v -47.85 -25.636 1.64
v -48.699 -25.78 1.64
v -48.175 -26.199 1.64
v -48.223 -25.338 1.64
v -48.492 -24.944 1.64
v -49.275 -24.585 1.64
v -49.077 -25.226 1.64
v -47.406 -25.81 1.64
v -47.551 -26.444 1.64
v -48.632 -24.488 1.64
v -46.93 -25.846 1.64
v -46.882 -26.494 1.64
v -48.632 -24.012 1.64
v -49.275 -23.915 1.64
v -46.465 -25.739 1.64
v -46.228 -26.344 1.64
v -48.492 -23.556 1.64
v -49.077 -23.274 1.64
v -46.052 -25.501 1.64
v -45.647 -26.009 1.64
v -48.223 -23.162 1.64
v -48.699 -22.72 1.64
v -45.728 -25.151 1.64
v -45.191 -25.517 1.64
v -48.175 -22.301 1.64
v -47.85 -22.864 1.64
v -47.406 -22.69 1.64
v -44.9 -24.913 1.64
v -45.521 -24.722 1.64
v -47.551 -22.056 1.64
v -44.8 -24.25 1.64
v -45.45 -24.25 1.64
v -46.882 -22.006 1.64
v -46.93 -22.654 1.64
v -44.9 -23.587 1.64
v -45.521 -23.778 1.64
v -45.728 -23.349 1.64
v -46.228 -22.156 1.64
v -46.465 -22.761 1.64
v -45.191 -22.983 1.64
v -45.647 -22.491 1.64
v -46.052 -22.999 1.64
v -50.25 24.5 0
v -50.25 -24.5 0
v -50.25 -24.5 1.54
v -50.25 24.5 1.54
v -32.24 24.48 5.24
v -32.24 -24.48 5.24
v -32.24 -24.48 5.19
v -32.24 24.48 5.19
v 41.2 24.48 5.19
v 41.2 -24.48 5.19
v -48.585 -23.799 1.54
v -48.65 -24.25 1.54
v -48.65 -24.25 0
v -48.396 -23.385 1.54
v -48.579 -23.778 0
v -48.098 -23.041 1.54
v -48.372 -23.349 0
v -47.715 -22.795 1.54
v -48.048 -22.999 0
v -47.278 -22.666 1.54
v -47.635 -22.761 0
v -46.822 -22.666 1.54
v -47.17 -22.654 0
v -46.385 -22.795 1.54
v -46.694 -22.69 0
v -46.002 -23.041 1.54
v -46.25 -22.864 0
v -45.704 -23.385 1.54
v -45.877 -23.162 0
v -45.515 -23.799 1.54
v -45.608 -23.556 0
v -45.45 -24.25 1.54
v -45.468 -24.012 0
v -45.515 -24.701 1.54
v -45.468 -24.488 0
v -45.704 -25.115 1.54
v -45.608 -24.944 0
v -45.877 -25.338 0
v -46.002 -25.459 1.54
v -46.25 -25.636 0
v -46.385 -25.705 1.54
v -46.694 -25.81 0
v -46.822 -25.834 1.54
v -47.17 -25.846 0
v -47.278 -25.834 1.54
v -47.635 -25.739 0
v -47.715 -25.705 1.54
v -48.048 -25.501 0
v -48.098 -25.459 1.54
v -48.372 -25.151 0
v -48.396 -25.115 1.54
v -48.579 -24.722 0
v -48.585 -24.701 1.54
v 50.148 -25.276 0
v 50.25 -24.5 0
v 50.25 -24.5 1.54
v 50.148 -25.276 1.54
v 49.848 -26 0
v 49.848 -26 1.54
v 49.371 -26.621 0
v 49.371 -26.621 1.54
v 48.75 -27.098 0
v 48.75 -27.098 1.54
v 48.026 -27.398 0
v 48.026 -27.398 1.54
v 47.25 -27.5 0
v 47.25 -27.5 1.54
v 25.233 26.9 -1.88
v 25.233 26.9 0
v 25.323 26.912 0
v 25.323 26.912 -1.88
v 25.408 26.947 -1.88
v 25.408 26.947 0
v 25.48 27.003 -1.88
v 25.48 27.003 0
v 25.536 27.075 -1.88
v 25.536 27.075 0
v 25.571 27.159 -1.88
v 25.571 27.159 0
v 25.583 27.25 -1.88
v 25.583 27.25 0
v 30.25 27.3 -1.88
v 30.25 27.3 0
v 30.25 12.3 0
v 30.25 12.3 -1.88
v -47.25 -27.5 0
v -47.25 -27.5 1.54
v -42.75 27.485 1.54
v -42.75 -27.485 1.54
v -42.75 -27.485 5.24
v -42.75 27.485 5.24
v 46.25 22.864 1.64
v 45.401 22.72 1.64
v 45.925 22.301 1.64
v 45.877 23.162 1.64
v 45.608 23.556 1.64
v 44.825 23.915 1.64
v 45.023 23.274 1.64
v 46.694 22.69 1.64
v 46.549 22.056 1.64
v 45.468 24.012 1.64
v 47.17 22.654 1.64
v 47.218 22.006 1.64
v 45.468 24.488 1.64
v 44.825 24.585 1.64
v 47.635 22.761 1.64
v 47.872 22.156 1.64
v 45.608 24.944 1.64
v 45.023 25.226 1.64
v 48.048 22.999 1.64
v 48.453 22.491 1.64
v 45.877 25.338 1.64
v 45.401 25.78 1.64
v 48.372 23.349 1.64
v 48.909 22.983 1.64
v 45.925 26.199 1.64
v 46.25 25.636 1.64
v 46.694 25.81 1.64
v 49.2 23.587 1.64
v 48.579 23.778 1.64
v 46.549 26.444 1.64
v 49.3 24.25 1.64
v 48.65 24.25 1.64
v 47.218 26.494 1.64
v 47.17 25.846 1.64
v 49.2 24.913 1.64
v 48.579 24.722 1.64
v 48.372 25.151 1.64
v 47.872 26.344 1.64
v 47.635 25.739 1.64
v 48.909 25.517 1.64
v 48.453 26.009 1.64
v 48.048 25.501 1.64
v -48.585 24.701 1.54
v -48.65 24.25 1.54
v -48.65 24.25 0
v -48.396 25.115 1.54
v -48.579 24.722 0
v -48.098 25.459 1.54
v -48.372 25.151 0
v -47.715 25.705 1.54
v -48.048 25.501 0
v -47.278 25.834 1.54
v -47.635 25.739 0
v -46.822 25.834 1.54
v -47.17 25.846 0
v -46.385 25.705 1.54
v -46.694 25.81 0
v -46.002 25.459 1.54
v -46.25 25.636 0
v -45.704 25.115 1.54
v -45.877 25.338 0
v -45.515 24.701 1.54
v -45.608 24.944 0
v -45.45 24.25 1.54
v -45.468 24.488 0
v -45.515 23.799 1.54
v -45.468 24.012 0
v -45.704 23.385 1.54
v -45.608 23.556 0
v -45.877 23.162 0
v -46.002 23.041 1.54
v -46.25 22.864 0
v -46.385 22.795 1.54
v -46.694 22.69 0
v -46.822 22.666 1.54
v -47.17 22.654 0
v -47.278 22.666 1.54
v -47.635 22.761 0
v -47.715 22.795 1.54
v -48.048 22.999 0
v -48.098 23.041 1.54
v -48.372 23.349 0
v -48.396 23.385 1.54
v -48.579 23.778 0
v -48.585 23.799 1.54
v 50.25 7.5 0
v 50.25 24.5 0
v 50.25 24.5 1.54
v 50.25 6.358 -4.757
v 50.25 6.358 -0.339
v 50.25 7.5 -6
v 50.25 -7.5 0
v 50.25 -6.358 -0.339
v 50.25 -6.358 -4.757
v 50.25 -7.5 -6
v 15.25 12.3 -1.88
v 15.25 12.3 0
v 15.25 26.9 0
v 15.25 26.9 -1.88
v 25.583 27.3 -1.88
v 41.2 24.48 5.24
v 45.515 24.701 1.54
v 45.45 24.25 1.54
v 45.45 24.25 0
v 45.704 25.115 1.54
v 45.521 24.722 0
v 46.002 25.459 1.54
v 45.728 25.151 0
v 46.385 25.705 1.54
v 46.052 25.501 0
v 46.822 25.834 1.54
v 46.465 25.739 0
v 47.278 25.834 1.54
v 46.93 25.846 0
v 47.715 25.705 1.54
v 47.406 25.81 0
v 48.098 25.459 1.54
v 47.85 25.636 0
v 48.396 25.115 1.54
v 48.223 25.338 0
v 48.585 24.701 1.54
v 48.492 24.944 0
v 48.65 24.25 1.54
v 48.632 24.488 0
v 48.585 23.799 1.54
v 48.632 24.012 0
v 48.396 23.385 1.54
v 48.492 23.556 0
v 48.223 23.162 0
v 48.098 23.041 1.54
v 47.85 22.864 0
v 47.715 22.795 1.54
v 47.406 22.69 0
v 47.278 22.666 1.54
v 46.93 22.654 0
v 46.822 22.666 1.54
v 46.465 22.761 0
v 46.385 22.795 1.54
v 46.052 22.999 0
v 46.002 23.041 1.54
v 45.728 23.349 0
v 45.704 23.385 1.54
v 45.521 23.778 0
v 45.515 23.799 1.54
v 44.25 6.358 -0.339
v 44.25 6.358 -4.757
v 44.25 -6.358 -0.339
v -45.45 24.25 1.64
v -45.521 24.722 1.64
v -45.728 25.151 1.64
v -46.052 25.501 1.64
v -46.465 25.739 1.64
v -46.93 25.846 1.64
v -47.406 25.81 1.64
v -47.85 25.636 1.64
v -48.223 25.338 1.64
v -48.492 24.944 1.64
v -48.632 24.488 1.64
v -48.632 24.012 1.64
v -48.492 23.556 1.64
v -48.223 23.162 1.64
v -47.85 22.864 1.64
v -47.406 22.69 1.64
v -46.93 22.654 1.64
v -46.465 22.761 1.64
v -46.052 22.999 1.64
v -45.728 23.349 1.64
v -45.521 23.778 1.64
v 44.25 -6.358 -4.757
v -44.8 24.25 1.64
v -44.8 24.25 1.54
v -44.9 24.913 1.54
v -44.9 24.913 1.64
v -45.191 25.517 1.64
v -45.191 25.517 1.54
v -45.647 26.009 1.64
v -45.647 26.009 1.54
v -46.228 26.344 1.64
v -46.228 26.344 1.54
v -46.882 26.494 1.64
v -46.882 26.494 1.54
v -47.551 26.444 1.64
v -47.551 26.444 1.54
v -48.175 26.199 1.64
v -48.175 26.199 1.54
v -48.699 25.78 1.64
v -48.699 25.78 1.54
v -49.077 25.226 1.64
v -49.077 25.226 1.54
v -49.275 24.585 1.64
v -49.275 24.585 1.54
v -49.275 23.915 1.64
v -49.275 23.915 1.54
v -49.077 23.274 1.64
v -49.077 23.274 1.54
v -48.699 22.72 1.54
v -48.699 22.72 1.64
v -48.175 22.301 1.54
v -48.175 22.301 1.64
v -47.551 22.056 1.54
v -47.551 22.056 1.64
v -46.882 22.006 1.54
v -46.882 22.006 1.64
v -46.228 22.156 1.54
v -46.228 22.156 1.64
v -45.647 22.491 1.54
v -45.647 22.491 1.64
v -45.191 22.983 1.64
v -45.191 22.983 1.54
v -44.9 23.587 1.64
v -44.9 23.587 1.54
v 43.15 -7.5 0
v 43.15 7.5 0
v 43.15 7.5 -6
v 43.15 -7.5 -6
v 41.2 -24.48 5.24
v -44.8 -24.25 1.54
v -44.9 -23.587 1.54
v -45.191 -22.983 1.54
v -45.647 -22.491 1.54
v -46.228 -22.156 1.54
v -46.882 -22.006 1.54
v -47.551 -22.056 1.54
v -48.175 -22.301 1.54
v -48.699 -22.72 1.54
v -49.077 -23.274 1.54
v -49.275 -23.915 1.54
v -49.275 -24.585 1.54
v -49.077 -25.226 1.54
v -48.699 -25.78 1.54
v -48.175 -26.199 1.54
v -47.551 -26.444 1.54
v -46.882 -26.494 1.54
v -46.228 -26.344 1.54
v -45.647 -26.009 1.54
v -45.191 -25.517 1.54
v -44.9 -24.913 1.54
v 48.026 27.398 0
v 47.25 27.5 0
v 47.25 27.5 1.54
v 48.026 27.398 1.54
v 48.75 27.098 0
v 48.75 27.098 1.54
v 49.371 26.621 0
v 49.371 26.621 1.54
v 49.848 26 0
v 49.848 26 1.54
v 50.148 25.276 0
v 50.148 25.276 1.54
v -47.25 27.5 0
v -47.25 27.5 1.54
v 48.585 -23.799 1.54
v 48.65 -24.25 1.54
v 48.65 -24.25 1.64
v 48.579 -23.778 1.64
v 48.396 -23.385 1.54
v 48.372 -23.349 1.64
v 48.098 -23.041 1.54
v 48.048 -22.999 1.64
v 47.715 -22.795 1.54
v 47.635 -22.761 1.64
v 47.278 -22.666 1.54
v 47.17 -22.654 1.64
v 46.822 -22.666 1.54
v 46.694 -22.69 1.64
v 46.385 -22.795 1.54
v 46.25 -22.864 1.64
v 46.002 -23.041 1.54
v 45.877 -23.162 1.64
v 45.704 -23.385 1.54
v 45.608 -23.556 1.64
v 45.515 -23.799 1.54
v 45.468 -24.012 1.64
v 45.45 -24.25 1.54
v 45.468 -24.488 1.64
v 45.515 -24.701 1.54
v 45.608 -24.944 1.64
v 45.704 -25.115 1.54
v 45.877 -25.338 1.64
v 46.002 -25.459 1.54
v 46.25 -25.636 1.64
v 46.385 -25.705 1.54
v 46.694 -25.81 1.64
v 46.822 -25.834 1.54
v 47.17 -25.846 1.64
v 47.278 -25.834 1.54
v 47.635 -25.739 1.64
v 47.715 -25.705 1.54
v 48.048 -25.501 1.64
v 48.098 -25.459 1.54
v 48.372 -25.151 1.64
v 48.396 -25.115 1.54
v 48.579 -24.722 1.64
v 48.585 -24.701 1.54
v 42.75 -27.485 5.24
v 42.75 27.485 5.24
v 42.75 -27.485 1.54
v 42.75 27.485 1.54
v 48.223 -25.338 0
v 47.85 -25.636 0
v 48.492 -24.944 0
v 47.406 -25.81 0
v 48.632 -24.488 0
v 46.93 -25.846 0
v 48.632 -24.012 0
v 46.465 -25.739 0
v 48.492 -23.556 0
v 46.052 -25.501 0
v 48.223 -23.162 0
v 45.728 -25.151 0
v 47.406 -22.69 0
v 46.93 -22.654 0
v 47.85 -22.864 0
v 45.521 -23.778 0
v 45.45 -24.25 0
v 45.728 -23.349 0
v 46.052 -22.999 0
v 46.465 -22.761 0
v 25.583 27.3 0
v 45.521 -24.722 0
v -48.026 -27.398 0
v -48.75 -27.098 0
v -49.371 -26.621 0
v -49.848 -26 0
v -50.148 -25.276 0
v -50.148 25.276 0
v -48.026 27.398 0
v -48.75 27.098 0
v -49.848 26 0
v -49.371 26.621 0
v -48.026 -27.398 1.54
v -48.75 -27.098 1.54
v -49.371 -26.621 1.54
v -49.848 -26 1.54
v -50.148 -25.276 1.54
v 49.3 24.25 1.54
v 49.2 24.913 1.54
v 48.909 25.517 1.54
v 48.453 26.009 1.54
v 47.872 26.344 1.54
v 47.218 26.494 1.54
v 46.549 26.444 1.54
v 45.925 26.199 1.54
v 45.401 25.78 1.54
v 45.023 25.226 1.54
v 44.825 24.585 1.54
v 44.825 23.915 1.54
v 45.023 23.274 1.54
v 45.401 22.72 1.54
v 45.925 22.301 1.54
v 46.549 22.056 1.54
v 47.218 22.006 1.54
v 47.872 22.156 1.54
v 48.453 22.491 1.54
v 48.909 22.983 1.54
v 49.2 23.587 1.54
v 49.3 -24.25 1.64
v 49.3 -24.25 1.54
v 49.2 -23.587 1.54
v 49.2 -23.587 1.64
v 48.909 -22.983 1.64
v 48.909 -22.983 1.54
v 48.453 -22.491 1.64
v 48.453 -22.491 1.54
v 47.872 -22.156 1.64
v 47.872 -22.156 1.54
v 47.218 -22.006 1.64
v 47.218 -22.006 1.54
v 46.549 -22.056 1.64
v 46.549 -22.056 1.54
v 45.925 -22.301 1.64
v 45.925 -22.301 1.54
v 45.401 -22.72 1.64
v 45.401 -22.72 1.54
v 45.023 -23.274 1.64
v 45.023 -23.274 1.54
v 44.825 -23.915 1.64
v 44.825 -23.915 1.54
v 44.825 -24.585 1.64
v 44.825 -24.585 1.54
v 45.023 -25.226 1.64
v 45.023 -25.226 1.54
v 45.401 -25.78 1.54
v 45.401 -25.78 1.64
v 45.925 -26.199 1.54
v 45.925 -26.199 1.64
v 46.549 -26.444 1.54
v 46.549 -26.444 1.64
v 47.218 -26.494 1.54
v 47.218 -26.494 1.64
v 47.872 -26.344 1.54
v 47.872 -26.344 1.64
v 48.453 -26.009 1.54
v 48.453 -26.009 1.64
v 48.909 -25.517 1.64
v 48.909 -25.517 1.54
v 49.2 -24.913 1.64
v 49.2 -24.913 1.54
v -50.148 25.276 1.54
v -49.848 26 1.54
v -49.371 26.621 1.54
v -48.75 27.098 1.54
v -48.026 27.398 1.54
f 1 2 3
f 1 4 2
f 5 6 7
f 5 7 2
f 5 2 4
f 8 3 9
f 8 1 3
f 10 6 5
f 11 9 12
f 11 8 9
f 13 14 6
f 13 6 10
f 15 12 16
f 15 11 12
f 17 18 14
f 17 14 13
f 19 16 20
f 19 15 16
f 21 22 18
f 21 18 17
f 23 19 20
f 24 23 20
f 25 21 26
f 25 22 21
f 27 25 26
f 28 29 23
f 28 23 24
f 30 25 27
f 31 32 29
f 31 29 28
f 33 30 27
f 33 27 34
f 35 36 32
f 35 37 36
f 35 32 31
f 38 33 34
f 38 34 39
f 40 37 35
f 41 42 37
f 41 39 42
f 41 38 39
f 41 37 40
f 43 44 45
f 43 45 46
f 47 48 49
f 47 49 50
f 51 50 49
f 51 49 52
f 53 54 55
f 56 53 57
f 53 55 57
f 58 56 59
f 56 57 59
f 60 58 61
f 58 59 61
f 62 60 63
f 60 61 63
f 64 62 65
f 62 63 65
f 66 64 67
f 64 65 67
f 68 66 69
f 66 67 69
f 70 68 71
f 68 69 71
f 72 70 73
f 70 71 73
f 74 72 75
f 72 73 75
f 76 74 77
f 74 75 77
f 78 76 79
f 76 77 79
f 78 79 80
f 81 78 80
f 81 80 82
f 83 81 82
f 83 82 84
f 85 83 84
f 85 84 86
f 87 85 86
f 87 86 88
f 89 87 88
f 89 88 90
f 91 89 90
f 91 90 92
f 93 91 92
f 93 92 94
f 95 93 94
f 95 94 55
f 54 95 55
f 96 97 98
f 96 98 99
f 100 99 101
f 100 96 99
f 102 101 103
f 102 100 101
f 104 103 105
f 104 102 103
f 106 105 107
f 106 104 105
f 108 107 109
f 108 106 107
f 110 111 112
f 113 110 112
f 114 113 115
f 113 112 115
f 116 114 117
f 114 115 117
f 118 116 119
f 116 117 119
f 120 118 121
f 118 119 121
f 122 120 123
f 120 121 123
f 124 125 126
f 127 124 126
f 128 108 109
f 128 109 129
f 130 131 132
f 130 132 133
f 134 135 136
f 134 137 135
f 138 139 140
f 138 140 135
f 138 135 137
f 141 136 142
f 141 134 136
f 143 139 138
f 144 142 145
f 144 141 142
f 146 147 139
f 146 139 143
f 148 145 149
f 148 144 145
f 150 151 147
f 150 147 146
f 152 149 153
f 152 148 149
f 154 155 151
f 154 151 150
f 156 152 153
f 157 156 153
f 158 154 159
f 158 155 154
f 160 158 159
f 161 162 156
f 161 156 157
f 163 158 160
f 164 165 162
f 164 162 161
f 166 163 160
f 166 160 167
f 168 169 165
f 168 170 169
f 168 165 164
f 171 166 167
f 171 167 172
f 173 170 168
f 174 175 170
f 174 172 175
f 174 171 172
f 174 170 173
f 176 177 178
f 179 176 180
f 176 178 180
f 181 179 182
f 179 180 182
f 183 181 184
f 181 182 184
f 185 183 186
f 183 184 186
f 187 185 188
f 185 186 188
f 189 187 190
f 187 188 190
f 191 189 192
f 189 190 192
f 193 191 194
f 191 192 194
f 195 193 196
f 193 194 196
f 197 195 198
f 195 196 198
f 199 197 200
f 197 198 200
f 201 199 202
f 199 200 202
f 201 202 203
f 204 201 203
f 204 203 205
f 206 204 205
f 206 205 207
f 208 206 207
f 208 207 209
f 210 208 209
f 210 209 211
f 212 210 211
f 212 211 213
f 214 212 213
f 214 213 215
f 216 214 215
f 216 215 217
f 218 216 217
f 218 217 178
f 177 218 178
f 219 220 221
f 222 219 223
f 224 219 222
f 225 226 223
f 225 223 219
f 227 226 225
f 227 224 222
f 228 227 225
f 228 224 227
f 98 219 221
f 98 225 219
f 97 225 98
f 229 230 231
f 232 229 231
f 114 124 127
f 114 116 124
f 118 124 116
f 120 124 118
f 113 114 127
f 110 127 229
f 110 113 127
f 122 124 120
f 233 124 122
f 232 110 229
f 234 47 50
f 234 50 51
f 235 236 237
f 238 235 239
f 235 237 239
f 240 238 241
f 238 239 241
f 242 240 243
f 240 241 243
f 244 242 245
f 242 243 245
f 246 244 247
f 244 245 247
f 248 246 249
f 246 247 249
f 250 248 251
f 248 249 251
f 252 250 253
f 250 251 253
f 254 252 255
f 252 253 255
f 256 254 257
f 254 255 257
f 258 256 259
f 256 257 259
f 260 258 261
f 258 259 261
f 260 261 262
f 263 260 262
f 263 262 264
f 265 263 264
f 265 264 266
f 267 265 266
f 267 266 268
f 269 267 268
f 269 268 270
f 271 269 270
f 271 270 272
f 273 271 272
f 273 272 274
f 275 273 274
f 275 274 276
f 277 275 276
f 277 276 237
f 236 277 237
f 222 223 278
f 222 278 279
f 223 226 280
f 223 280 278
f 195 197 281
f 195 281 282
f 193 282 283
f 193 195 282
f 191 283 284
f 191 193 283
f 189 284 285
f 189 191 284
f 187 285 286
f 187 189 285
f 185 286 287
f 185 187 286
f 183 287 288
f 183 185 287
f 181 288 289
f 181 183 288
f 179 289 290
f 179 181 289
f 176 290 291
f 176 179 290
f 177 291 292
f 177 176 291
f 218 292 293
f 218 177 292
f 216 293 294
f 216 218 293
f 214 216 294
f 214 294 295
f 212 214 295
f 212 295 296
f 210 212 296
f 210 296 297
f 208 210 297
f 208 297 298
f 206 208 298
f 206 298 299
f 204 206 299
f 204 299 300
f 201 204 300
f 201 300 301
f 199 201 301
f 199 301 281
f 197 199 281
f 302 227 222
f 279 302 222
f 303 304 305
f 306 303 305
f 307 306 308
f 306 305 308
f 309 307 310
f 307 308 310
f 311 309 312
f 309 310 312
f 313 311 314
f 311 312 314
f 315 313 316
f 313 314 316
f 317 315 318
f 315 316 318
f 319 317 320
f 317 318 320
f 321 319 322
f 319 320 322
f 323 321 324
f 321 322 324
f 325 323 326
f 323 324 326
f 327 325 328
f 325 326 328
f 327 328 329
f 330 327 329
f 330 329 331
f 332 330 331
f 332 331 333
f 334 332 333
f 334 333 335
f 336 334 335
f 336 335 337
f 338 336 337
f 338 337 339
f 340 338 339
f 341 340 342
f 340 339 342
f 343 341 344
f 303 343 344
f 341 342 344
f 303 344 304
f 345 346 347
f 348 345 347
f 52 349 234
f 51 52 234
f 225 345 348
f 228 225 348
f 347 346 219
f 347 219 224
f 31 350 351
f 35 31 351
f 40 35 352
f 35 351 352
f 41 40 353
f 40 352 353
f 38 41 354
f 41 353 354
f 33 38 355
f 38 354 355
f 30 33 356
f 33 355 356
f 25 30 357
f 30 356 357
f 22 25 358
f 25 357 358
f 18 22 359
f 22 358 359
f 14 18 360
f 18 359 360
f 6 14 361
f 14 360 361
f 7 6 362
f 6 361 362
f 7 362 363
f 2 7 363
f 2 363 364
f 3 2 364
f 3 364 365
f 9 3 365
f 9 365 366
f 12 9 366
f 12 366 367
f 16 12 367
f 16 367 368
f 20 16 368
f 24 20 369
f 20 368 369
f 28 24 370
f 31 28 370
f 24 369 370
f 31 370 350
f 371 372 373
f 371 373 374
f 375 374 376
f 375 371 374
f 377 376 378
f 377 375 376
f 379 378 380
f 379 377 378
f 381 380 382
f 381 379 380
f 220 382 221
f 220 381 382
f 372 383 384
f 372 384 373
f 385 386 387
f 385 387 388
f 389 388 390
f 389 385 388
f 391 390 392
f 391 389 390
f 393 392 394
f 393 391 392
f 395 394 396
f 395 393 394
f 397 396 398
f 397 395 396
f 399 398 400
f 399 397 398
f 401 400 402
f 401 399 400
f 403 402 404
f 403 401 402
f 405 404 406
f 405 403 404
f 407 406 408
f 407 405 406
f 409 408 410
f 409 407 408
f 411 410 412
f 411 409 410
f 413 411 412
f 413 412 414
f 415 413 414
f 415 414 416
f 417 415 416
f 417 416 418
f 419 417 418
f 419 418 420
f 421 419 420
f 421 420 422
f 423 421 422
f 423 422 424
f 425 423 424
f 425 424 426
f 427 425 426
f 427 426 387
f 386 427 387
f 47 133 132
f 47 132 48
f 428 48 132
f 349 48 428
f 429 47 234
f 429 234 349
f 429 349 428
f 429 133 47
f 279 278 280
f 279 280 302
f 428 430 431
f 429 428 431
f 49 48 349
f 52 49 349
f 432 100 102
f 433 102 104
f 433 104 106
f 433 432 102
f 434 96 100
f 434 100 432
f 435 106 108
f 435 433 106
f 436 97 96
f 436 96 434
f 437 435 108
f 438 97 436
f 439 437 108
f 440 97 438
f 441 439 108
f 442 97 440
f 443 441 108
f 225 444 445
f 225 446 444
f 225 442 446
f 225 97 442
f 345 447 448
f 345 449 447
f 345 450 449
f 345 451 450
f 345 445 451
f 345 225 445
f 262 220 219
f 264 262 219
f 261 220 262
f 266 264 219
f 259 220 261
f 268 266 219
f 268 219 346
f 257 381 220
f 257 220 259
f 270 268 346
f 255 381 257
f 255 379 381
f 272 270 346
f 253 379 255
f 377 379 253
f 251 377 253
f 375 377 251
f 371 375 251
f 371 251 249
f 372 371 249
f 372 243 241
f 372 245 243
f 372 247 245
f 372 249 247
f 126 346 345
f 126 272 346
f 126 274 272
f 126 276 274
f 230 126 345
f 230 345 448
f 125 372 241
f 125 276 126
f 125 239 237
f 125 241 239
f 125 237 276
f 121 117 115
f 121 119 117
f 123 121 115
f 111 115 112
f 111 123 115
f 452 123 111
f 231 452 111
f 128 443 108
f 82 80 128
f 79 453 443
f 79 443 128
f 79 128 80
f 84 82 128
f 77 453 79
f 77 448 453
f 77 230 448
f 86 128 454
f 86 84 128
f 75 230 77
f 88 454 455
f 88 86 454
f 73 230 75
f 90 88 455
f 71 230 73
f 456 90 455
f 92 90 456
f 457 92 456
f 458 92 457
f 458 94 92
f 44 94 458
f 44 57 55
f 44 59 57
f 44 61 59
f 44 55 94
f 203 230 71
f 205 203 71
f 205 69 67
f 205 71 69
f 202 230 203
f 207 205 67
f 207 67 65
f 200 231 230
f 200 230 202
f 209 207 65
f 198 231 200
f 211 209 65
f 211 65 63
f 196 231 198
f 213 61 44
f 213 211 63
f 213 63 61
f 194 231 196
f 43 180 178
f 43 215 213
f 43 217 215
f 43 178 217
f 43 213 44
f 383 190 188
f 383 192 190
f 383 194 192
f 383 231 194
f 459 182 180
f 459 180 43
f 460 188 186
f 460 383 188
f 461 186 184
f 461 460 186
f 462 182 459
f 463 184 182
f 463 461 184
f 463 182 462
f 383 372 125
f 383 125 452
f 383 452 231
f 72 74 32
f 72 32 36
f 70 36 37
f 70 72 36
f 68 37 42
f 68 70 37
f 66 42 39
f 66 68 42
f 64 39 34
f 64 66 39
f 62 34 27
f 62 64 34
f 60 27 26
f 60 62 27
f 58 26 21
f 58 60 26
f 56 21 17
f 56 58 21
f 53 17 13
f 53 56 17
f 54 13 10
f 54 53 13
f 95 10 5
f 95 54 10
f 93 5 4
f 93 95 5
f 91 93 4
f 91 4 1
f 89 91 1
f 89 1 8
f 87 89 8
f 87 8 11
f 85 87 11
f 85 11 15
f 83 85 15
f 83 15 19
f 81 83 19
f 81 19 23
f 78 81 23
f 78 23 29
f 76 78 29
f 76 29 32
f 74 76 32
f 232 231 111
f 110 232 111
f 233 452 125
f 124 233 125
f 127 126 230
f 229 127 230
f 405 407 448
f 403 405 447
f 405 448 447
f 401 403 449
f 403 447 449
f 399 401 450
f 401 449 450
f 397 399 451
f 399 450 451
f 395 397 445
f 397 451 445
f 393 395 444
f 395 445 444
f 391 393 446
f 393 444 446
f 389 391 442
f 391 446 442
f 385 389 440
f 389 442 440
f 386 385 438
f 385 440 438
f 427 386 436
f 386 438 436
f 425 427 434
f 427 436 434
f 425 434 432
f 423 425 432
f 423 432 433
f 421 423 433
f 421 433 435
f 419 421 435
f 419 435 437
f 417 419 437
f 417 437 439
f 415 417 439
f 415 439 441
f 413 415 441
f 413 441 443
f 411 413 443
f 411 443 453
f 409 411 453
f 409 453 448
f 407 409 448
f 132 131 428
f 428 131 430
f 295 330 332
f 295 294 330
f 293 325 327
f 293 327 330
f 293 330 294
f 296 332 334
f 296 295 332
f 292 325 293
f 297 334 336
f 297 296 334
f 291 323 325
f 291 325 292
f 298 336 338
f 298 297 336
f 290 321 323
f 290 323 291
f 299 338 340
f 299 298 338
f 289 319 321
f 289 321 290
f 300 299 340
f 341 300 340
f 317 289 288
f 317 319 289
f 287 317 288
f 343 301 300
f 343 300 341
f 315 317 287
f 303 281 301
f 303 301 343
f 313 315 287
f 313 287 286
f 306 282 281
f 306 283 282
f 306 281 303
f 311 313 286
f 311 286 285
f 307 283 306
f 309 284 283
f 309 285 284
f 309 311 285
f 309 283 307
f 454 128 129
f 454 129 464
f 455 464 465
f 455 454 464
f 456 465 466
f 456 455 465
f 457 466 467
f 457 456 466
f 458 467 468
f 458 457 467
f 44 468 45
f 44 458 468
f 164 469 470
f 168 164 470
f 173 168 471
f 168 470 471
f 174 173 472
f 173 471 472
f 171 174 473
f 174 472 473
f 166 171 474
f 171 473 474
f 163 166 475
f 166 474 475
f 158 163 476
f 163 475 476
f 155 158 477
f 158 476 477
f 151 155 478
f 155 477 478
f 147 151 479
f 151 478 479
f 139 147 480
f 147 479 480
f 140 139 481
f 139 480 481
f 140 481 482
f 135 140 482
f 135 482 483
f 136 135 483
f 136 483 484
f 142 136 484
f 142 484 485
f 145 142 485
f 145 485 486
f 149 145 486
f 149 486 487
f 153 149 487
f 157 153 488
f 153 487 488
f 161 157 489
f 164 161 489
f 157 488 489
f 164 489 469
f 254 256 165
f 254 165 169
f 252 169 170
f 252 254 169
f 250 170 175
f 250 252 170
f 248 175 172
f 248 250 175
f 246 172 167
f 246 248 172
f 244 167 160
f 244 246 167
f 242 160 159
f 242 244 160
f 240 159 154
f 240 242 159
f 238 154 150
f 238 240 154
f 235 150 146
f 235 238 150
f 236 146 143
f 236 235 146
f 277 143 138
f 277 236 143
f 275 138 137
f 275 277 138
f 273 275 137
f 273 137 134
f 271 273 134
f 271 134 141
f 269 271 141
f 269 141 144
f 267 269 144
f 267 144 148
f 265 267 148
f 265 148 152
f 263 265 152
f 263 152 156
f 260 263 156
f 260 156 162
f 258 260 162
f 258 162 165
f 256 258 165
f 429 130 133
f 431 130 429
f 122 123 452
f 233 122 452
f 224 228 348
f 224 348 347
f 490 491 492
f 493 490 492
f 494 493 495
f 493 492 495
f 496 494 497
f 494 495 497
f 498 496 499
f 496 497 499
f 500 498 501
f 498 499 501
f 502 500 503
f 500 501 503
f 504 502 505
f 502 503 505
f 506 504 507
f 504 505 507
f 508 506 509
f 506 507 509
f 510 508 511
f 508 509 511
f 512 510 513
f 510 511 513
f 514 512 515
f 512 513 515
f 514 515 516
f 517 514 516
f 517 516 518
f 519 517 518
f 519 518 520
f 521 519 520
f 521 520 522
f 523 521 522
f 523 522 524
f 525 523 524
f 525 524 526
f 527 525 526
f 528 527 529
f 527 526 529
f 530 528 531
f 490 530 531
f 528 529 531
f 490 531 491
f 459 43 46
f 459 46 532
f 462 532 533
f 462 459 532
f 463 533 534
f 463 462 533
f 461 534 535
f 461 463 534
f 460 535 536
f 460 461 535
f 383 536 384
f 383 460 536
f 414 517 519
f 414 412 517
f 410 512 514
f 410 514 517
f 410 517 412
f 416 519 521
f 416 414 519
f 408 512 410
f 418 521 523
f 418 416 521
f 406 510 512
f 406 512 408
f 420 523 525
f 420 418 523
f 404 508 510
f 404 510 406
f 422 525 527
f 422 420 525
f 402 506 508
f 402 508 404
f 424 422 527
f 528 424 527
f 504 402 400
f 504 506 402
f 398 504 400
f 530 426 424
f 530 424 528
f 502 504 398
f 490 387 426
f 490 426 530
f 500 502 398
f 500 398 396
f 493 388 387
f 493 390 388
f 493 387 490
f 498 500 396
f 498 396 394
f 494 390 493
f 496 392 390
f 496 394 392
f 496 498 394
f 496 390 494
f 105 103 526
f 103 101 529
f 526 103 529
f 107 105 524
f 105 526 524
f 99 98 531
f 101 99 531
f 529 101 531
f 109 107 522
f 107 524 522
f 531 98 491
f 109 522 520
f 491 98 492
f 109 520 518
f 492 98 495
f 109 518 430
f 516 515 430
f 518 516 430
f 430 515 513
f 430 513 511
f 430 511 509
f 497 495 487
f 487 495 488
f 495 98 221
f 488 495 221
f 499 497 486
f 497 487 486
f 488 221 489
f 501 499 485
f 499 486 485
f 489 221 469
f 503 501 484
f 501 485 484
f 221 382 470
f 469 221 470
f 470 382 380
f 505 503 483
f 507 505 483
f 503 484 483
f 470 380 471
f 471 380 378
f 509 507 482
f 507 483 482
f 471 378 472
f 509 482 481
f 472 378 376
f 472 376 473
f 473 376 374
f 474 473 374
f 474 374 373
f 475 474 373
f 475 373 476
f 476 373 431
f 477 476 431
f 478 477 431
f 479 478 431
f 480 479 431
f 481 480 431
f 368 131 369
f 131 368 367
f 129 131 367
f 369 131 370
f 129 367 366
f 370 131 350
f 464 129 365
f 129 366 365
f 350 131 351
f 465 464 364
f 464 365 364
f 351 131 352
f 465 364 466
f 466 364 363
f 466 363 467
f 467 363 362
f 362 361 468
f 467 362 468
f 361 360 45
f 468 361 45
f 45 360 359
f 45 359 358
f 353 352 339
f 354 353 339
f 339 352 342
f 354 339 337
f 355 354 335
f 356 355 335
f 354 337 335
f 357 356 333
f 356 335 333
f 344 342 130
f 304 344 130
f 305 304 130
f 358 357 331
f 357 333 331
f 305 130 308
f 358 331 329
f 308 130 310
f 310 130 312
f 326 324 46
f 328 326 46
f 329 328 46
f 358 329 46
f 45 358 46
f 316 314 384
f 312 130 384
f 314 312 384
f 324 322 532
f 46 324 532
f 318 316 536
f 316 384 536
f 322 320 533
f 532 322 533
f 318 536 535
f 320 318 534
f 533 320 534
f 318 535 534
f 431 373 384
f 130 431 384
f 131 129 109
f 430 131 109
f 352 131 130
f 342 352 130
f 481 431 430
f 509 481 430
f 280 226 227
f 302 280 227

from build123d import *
from build123d.topology import SkipClean

# Parameters (mm, degrees)
BOSS_EXTRUDE1_DEPTH        = 1.54
F_3_2_3_2_DIAMETER_HOLE1_D = 3.2
SKETCH4_R                  = 2.25
SKETCH4_R_2                = 1.6
BOSS_EXTRUDE2_DEPTH        = 0.1
SKETCH5_W                  = 85.5
SKETCH5_H                  = 54.969341598
BOSS_EXTRUDE3_DEPTH        = 3.7
SKETCH6_W                  = 73.44
SKETCH6_H                  = 48.96
CUT_EXTRUDE1_DEPTH         = 0.05
SKETCH7_W                  = 6
SKETCH7_H                  = 15
BOSS_EXTRUDE4_DEPTH        = 7.1
SKETCH8_W                  = 4.418406876
SKETCH8_H                  = 12.715571876
CUT_EXTRUDE2_DEPTH         = 6
BOSS_EXTRUDE5_DEPTH        = 1.88


with BuildPart() as part:
    # Sketch1 → Boss-Extrude1 (new body)
    with BuildSketch(Plane.XY):
        with BuildLine():
            Line((-47.25, 27.5), (47.25, 27.5))
            ThreePointArc((47.25, 27.5), (49.371320344, 26.621320344), (50.25, 24.5))
            Line((50.25, 24.5), (50.25, -24.5))
            ThreePointArc((50.25, -24.5), (49.371320344, -26.621320344), (47.25, -27.5))
            Line((47.25, -27.5), (-47.25, -27.5))
            ThreePointArc((-47.25, -27.5), (-49.371320344, -26.621320344), (-50.25, -24.5))
            Line((-50.25, -24.5), (-50.25, 24.5))
            ThreePointArc((-50.25, 24.5), (-49.371320344, 26.621320344), (-47.25, 27.5))
        make_face()
    extrude(amount=BOSS_EXTRUDE1_DEPTH)

    # Ø3.2 (3.2) Diameter Hole1 (through all)
    with Locations(Plane.XY.offset(1.54)):
        with Locations((-47.05, 24.25), (47.05, 24.25), (47.05, -24.25), (-47.05, -24.25)):
            Hole(F_3_2_3_2_DIAMETER_HOLE1_D / 2)

    # Sketch4 → Boss-Extrude2 (add)
    # profile 1 of 4: a face of its own
    with SkipClean():  # the faces are left unmerged after this step: merging them gives an invalid solid
        with BuildSketch(Plane.XY.offset(1.54)):
            with Locations((-47.05, 24.25)):
                Circle(SKETCH4_R)
            with Locations((-47.05, 24.25)):
                Circle(SKETCH4_R_2, mode=Mode.SUBTRACT)
        # profile 2 of 4: a face of its own
        with BuildSketch(Plane.XY.offset(1.54)):
            with Locations((-47.05, -24.25)):
                Circle(SKETCH4_R)
            with Locations((-47.05, -24.25)):
                Circle(SKETCH4_R_2, mode=Mode.SUBTRACT)
        # profile 3 of 4: a face of its own
        with BuildSketch(Plane.XY.offset(1.54)):
            with Locations((47.05, -24.25)):
                Circle(SKETCH4_R)
            with Locations((47.05, -24.25)):
                Circle(SKETCH4_R_2, mode=Mode.SUBTRACT)
        # profile 4 of 4: a face of its own
        with BuildSketch(Plane.XY.offset(1.54)):
            with Locations((47.05, 24.25)):
                Circle(SKETCH4_R)
            with Locations((47.05, 24.25)):
                Circle(SKETCH4_R_2, mode=Mode.SUBTRACT)
        extrude(amount=BOSS_EXTRUDE2_DEPTH)
    add(part.part.scale(1), mode=Mode.REPLACE)  # the faces are merged on a copy

    # Sketch5 → Boss-Extrude3 (add)
    with BuildSketch(Plane.XY.offset(1.54)):
        Rectangle(SKETCH5_W, SKETCH5_H)
    extrude(amount=BOSS_EXTRUDE3_DEPTH)

    # Sketch6 → Cut-Extrude1 (cut)
    with BuildSketch(Plane.XY.offset(5.24)):
        with Locations((4.48, 0)):
            Rectangle(SKETCH6_W, SKETCH6_H)
    extrude(amount=-CUT_EXTRUDE1_DEPTH, mode=Mode.SUBTRACT)

    # Sketch7 → Boss-Extrude4 (add)
    with BuildSketch(Plane(origin=(50.25, 0, 0), x_dir=(0, 0, -1), z_dir=(1, 0, 0))):
        with Locations((3, 0)):
            Rectangle(SKETCH7_W, SKETCH7_H)
    extrude(amount=-BOSS_EXTRUDE4_DEPTH)

    # Sketch8 → Cut-Extrude2 (cut)
    with BuildSketch(Plane(origin=(50.25, 0, 0), x_dir=(0, 0, -1), z_dir=(1, 0, 0))):
        with Locations((2.548027157, 0)):
            Rectangle(SKETCH8_W, SKETCH8_H)
    extrude(amount=-CUT_EXTRUDE2_DEPTH, mode=Mode.SUBTRACT)

    # Sketch9 → Boss-Extrude5 (add)
    with BuildSketch(Plane(origin=(0, 0, 0), x_dir=(-1, 0, 0), z_dir=(0, 0, -1))):
        with BuildLine():
            Line((-30.25, 12.3), (-15.25, 12.3))
            Line((-15.25, 12.3), (-15.25, 26.9))
            Line((-15.25, 26.9), (-25.232632272, 26.9))
            ThreePointArc((-25.232632272, 26.9), (-25.480119645, 27.002512627), (-25.582632272, 27.25))
            Line((-25.582632272, 27.25), (-25.582632272, 27.3))
            Line((-25.582632272, 27.3), (-30.25, 27.3))
            Line((-30.25, 27.3), (-30.25, 12.3))
        make_face()
    extrude(amount=BOSS_EXTRUDE5_DEPTH)


solid = part.part
